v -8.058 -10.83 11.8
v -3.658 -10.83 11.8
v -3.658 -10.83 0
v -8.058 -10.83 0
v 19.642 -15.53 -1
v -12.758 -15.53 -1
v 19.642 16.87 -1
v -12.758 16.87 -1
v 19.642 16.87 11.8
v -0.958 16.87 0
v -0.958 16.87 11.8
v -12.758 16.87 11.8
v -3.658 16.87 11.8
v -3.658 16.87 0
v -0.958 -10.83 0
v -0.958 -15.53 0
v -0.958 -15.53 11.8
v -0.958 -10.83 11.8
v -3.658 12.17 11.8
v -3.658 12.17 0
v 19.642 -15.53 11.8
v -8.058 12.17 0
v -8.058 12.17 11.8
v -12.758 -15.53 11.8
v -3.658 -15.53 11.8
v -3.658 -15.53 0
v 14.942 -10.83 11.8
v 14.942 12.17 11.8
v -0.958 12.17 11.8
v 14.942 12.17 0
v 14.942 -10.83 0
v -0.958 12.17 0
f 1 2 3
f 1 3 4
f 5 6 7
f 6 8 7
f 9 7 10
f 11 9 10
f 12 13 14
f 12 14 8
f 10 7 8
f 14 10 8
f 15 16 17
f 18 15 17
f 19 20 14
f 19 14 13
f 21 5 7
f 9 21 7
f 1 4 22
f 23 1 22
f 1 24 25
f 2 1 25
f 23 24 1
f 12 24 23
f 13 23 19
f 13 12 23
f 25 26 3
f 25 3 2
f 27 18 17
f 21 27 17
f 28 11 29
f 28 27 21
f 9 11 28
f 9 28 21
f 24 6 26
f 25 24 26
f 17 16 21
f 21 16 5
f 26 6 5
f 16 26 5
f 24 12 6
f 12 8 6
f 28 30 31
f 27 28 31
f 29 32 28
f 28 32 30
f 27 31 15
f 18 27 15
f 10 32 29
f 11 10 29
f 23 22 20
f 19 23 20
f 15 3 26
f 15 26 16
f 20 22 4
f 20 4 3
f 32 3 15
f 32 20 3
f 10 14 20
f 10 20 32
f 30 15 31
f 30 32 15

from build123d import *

# Parameters (mm, degrees)
F0_W     = 23
F0_H     = 23
F1_DEPTH = 1
F2_DEPTH = 11.8
F3_W     = 2.7
F3_H     = 11.8
F4_DEPTH = 32.401


with BuildPart() as f1:
    # F0 (on Top) → F1 (new body)
    with BuildSketch(Plane.XY):
        with Locations((3.442476, 0.669988)):
            Rectangle(F0_W, F0_H)
        Polygon((14.942476, -10.830012), (-8.057524, -10.830012), (-12.757524, -10.830012), (-12.757524, -15.530012), (14.942476, -15.530012), align=None)
        Polygon((-8.057524, -10.830012), (-8.057524, 12.169988), (-8.057524, 16.869988), (-12.757524, 16.869988), (-12.757524, -10.830012), align=None)
        Polygon((-8.057524, 16.869988), (-8.057524, 12.169988), (14.942476, 12.169988), (19.642476, 12.169988), (19.642476, 16.869988), align=None)
        Polygon((19.642476, 12.169988), (14.942476, 12.169988), (14.942476, -10.830012), (14.942476, -15.530012), (19.642476, -15.530012), align=None)
    extrude(amount=-F1_DEPTH)

    # F0 (on Top) → F2 (join)
    with BuildSketch(Plane.XY):
        Polygon((-8.057524, 16.869988), (-8.057524, 12.169988), (14.942476, 12.169988), (19.642476, 12.169988), (19.642476, 16.869988), align=None)
        Polygon((-8.057524, -10.830012), (-8.057524, 12.169988), (-8.057524, 16.869988), (-12.757524, 16.869988), (-12.757524, -10.830012), align=None)
        Polygon((19.642476, 12.169988), (14.942476, 12.169988), (14.942476, -10.830012), (14.942476, -15.530012), (19.642476, -15.530012), align=None)
        Polygon((14.942476, -10.830012), (-8.057524, -10.830012), (-12.757524, -10.830012), (-12.757524, -15.530012), (14.942476, -15.530012), align=None)
    extrude(amount=F2_DEPTH)

    # F3 (on face) → F4 (cut, through all)
    with BuildSketch(Plane.XZ.offset(15.530012)):
        with Locations((-2.307524, 5.9)):
            Rectangle(F3_W, F3_H)
    extrude(amount=-F4_DEPTH, mode=Mode.SUBTRACT)


solid = f1.part
